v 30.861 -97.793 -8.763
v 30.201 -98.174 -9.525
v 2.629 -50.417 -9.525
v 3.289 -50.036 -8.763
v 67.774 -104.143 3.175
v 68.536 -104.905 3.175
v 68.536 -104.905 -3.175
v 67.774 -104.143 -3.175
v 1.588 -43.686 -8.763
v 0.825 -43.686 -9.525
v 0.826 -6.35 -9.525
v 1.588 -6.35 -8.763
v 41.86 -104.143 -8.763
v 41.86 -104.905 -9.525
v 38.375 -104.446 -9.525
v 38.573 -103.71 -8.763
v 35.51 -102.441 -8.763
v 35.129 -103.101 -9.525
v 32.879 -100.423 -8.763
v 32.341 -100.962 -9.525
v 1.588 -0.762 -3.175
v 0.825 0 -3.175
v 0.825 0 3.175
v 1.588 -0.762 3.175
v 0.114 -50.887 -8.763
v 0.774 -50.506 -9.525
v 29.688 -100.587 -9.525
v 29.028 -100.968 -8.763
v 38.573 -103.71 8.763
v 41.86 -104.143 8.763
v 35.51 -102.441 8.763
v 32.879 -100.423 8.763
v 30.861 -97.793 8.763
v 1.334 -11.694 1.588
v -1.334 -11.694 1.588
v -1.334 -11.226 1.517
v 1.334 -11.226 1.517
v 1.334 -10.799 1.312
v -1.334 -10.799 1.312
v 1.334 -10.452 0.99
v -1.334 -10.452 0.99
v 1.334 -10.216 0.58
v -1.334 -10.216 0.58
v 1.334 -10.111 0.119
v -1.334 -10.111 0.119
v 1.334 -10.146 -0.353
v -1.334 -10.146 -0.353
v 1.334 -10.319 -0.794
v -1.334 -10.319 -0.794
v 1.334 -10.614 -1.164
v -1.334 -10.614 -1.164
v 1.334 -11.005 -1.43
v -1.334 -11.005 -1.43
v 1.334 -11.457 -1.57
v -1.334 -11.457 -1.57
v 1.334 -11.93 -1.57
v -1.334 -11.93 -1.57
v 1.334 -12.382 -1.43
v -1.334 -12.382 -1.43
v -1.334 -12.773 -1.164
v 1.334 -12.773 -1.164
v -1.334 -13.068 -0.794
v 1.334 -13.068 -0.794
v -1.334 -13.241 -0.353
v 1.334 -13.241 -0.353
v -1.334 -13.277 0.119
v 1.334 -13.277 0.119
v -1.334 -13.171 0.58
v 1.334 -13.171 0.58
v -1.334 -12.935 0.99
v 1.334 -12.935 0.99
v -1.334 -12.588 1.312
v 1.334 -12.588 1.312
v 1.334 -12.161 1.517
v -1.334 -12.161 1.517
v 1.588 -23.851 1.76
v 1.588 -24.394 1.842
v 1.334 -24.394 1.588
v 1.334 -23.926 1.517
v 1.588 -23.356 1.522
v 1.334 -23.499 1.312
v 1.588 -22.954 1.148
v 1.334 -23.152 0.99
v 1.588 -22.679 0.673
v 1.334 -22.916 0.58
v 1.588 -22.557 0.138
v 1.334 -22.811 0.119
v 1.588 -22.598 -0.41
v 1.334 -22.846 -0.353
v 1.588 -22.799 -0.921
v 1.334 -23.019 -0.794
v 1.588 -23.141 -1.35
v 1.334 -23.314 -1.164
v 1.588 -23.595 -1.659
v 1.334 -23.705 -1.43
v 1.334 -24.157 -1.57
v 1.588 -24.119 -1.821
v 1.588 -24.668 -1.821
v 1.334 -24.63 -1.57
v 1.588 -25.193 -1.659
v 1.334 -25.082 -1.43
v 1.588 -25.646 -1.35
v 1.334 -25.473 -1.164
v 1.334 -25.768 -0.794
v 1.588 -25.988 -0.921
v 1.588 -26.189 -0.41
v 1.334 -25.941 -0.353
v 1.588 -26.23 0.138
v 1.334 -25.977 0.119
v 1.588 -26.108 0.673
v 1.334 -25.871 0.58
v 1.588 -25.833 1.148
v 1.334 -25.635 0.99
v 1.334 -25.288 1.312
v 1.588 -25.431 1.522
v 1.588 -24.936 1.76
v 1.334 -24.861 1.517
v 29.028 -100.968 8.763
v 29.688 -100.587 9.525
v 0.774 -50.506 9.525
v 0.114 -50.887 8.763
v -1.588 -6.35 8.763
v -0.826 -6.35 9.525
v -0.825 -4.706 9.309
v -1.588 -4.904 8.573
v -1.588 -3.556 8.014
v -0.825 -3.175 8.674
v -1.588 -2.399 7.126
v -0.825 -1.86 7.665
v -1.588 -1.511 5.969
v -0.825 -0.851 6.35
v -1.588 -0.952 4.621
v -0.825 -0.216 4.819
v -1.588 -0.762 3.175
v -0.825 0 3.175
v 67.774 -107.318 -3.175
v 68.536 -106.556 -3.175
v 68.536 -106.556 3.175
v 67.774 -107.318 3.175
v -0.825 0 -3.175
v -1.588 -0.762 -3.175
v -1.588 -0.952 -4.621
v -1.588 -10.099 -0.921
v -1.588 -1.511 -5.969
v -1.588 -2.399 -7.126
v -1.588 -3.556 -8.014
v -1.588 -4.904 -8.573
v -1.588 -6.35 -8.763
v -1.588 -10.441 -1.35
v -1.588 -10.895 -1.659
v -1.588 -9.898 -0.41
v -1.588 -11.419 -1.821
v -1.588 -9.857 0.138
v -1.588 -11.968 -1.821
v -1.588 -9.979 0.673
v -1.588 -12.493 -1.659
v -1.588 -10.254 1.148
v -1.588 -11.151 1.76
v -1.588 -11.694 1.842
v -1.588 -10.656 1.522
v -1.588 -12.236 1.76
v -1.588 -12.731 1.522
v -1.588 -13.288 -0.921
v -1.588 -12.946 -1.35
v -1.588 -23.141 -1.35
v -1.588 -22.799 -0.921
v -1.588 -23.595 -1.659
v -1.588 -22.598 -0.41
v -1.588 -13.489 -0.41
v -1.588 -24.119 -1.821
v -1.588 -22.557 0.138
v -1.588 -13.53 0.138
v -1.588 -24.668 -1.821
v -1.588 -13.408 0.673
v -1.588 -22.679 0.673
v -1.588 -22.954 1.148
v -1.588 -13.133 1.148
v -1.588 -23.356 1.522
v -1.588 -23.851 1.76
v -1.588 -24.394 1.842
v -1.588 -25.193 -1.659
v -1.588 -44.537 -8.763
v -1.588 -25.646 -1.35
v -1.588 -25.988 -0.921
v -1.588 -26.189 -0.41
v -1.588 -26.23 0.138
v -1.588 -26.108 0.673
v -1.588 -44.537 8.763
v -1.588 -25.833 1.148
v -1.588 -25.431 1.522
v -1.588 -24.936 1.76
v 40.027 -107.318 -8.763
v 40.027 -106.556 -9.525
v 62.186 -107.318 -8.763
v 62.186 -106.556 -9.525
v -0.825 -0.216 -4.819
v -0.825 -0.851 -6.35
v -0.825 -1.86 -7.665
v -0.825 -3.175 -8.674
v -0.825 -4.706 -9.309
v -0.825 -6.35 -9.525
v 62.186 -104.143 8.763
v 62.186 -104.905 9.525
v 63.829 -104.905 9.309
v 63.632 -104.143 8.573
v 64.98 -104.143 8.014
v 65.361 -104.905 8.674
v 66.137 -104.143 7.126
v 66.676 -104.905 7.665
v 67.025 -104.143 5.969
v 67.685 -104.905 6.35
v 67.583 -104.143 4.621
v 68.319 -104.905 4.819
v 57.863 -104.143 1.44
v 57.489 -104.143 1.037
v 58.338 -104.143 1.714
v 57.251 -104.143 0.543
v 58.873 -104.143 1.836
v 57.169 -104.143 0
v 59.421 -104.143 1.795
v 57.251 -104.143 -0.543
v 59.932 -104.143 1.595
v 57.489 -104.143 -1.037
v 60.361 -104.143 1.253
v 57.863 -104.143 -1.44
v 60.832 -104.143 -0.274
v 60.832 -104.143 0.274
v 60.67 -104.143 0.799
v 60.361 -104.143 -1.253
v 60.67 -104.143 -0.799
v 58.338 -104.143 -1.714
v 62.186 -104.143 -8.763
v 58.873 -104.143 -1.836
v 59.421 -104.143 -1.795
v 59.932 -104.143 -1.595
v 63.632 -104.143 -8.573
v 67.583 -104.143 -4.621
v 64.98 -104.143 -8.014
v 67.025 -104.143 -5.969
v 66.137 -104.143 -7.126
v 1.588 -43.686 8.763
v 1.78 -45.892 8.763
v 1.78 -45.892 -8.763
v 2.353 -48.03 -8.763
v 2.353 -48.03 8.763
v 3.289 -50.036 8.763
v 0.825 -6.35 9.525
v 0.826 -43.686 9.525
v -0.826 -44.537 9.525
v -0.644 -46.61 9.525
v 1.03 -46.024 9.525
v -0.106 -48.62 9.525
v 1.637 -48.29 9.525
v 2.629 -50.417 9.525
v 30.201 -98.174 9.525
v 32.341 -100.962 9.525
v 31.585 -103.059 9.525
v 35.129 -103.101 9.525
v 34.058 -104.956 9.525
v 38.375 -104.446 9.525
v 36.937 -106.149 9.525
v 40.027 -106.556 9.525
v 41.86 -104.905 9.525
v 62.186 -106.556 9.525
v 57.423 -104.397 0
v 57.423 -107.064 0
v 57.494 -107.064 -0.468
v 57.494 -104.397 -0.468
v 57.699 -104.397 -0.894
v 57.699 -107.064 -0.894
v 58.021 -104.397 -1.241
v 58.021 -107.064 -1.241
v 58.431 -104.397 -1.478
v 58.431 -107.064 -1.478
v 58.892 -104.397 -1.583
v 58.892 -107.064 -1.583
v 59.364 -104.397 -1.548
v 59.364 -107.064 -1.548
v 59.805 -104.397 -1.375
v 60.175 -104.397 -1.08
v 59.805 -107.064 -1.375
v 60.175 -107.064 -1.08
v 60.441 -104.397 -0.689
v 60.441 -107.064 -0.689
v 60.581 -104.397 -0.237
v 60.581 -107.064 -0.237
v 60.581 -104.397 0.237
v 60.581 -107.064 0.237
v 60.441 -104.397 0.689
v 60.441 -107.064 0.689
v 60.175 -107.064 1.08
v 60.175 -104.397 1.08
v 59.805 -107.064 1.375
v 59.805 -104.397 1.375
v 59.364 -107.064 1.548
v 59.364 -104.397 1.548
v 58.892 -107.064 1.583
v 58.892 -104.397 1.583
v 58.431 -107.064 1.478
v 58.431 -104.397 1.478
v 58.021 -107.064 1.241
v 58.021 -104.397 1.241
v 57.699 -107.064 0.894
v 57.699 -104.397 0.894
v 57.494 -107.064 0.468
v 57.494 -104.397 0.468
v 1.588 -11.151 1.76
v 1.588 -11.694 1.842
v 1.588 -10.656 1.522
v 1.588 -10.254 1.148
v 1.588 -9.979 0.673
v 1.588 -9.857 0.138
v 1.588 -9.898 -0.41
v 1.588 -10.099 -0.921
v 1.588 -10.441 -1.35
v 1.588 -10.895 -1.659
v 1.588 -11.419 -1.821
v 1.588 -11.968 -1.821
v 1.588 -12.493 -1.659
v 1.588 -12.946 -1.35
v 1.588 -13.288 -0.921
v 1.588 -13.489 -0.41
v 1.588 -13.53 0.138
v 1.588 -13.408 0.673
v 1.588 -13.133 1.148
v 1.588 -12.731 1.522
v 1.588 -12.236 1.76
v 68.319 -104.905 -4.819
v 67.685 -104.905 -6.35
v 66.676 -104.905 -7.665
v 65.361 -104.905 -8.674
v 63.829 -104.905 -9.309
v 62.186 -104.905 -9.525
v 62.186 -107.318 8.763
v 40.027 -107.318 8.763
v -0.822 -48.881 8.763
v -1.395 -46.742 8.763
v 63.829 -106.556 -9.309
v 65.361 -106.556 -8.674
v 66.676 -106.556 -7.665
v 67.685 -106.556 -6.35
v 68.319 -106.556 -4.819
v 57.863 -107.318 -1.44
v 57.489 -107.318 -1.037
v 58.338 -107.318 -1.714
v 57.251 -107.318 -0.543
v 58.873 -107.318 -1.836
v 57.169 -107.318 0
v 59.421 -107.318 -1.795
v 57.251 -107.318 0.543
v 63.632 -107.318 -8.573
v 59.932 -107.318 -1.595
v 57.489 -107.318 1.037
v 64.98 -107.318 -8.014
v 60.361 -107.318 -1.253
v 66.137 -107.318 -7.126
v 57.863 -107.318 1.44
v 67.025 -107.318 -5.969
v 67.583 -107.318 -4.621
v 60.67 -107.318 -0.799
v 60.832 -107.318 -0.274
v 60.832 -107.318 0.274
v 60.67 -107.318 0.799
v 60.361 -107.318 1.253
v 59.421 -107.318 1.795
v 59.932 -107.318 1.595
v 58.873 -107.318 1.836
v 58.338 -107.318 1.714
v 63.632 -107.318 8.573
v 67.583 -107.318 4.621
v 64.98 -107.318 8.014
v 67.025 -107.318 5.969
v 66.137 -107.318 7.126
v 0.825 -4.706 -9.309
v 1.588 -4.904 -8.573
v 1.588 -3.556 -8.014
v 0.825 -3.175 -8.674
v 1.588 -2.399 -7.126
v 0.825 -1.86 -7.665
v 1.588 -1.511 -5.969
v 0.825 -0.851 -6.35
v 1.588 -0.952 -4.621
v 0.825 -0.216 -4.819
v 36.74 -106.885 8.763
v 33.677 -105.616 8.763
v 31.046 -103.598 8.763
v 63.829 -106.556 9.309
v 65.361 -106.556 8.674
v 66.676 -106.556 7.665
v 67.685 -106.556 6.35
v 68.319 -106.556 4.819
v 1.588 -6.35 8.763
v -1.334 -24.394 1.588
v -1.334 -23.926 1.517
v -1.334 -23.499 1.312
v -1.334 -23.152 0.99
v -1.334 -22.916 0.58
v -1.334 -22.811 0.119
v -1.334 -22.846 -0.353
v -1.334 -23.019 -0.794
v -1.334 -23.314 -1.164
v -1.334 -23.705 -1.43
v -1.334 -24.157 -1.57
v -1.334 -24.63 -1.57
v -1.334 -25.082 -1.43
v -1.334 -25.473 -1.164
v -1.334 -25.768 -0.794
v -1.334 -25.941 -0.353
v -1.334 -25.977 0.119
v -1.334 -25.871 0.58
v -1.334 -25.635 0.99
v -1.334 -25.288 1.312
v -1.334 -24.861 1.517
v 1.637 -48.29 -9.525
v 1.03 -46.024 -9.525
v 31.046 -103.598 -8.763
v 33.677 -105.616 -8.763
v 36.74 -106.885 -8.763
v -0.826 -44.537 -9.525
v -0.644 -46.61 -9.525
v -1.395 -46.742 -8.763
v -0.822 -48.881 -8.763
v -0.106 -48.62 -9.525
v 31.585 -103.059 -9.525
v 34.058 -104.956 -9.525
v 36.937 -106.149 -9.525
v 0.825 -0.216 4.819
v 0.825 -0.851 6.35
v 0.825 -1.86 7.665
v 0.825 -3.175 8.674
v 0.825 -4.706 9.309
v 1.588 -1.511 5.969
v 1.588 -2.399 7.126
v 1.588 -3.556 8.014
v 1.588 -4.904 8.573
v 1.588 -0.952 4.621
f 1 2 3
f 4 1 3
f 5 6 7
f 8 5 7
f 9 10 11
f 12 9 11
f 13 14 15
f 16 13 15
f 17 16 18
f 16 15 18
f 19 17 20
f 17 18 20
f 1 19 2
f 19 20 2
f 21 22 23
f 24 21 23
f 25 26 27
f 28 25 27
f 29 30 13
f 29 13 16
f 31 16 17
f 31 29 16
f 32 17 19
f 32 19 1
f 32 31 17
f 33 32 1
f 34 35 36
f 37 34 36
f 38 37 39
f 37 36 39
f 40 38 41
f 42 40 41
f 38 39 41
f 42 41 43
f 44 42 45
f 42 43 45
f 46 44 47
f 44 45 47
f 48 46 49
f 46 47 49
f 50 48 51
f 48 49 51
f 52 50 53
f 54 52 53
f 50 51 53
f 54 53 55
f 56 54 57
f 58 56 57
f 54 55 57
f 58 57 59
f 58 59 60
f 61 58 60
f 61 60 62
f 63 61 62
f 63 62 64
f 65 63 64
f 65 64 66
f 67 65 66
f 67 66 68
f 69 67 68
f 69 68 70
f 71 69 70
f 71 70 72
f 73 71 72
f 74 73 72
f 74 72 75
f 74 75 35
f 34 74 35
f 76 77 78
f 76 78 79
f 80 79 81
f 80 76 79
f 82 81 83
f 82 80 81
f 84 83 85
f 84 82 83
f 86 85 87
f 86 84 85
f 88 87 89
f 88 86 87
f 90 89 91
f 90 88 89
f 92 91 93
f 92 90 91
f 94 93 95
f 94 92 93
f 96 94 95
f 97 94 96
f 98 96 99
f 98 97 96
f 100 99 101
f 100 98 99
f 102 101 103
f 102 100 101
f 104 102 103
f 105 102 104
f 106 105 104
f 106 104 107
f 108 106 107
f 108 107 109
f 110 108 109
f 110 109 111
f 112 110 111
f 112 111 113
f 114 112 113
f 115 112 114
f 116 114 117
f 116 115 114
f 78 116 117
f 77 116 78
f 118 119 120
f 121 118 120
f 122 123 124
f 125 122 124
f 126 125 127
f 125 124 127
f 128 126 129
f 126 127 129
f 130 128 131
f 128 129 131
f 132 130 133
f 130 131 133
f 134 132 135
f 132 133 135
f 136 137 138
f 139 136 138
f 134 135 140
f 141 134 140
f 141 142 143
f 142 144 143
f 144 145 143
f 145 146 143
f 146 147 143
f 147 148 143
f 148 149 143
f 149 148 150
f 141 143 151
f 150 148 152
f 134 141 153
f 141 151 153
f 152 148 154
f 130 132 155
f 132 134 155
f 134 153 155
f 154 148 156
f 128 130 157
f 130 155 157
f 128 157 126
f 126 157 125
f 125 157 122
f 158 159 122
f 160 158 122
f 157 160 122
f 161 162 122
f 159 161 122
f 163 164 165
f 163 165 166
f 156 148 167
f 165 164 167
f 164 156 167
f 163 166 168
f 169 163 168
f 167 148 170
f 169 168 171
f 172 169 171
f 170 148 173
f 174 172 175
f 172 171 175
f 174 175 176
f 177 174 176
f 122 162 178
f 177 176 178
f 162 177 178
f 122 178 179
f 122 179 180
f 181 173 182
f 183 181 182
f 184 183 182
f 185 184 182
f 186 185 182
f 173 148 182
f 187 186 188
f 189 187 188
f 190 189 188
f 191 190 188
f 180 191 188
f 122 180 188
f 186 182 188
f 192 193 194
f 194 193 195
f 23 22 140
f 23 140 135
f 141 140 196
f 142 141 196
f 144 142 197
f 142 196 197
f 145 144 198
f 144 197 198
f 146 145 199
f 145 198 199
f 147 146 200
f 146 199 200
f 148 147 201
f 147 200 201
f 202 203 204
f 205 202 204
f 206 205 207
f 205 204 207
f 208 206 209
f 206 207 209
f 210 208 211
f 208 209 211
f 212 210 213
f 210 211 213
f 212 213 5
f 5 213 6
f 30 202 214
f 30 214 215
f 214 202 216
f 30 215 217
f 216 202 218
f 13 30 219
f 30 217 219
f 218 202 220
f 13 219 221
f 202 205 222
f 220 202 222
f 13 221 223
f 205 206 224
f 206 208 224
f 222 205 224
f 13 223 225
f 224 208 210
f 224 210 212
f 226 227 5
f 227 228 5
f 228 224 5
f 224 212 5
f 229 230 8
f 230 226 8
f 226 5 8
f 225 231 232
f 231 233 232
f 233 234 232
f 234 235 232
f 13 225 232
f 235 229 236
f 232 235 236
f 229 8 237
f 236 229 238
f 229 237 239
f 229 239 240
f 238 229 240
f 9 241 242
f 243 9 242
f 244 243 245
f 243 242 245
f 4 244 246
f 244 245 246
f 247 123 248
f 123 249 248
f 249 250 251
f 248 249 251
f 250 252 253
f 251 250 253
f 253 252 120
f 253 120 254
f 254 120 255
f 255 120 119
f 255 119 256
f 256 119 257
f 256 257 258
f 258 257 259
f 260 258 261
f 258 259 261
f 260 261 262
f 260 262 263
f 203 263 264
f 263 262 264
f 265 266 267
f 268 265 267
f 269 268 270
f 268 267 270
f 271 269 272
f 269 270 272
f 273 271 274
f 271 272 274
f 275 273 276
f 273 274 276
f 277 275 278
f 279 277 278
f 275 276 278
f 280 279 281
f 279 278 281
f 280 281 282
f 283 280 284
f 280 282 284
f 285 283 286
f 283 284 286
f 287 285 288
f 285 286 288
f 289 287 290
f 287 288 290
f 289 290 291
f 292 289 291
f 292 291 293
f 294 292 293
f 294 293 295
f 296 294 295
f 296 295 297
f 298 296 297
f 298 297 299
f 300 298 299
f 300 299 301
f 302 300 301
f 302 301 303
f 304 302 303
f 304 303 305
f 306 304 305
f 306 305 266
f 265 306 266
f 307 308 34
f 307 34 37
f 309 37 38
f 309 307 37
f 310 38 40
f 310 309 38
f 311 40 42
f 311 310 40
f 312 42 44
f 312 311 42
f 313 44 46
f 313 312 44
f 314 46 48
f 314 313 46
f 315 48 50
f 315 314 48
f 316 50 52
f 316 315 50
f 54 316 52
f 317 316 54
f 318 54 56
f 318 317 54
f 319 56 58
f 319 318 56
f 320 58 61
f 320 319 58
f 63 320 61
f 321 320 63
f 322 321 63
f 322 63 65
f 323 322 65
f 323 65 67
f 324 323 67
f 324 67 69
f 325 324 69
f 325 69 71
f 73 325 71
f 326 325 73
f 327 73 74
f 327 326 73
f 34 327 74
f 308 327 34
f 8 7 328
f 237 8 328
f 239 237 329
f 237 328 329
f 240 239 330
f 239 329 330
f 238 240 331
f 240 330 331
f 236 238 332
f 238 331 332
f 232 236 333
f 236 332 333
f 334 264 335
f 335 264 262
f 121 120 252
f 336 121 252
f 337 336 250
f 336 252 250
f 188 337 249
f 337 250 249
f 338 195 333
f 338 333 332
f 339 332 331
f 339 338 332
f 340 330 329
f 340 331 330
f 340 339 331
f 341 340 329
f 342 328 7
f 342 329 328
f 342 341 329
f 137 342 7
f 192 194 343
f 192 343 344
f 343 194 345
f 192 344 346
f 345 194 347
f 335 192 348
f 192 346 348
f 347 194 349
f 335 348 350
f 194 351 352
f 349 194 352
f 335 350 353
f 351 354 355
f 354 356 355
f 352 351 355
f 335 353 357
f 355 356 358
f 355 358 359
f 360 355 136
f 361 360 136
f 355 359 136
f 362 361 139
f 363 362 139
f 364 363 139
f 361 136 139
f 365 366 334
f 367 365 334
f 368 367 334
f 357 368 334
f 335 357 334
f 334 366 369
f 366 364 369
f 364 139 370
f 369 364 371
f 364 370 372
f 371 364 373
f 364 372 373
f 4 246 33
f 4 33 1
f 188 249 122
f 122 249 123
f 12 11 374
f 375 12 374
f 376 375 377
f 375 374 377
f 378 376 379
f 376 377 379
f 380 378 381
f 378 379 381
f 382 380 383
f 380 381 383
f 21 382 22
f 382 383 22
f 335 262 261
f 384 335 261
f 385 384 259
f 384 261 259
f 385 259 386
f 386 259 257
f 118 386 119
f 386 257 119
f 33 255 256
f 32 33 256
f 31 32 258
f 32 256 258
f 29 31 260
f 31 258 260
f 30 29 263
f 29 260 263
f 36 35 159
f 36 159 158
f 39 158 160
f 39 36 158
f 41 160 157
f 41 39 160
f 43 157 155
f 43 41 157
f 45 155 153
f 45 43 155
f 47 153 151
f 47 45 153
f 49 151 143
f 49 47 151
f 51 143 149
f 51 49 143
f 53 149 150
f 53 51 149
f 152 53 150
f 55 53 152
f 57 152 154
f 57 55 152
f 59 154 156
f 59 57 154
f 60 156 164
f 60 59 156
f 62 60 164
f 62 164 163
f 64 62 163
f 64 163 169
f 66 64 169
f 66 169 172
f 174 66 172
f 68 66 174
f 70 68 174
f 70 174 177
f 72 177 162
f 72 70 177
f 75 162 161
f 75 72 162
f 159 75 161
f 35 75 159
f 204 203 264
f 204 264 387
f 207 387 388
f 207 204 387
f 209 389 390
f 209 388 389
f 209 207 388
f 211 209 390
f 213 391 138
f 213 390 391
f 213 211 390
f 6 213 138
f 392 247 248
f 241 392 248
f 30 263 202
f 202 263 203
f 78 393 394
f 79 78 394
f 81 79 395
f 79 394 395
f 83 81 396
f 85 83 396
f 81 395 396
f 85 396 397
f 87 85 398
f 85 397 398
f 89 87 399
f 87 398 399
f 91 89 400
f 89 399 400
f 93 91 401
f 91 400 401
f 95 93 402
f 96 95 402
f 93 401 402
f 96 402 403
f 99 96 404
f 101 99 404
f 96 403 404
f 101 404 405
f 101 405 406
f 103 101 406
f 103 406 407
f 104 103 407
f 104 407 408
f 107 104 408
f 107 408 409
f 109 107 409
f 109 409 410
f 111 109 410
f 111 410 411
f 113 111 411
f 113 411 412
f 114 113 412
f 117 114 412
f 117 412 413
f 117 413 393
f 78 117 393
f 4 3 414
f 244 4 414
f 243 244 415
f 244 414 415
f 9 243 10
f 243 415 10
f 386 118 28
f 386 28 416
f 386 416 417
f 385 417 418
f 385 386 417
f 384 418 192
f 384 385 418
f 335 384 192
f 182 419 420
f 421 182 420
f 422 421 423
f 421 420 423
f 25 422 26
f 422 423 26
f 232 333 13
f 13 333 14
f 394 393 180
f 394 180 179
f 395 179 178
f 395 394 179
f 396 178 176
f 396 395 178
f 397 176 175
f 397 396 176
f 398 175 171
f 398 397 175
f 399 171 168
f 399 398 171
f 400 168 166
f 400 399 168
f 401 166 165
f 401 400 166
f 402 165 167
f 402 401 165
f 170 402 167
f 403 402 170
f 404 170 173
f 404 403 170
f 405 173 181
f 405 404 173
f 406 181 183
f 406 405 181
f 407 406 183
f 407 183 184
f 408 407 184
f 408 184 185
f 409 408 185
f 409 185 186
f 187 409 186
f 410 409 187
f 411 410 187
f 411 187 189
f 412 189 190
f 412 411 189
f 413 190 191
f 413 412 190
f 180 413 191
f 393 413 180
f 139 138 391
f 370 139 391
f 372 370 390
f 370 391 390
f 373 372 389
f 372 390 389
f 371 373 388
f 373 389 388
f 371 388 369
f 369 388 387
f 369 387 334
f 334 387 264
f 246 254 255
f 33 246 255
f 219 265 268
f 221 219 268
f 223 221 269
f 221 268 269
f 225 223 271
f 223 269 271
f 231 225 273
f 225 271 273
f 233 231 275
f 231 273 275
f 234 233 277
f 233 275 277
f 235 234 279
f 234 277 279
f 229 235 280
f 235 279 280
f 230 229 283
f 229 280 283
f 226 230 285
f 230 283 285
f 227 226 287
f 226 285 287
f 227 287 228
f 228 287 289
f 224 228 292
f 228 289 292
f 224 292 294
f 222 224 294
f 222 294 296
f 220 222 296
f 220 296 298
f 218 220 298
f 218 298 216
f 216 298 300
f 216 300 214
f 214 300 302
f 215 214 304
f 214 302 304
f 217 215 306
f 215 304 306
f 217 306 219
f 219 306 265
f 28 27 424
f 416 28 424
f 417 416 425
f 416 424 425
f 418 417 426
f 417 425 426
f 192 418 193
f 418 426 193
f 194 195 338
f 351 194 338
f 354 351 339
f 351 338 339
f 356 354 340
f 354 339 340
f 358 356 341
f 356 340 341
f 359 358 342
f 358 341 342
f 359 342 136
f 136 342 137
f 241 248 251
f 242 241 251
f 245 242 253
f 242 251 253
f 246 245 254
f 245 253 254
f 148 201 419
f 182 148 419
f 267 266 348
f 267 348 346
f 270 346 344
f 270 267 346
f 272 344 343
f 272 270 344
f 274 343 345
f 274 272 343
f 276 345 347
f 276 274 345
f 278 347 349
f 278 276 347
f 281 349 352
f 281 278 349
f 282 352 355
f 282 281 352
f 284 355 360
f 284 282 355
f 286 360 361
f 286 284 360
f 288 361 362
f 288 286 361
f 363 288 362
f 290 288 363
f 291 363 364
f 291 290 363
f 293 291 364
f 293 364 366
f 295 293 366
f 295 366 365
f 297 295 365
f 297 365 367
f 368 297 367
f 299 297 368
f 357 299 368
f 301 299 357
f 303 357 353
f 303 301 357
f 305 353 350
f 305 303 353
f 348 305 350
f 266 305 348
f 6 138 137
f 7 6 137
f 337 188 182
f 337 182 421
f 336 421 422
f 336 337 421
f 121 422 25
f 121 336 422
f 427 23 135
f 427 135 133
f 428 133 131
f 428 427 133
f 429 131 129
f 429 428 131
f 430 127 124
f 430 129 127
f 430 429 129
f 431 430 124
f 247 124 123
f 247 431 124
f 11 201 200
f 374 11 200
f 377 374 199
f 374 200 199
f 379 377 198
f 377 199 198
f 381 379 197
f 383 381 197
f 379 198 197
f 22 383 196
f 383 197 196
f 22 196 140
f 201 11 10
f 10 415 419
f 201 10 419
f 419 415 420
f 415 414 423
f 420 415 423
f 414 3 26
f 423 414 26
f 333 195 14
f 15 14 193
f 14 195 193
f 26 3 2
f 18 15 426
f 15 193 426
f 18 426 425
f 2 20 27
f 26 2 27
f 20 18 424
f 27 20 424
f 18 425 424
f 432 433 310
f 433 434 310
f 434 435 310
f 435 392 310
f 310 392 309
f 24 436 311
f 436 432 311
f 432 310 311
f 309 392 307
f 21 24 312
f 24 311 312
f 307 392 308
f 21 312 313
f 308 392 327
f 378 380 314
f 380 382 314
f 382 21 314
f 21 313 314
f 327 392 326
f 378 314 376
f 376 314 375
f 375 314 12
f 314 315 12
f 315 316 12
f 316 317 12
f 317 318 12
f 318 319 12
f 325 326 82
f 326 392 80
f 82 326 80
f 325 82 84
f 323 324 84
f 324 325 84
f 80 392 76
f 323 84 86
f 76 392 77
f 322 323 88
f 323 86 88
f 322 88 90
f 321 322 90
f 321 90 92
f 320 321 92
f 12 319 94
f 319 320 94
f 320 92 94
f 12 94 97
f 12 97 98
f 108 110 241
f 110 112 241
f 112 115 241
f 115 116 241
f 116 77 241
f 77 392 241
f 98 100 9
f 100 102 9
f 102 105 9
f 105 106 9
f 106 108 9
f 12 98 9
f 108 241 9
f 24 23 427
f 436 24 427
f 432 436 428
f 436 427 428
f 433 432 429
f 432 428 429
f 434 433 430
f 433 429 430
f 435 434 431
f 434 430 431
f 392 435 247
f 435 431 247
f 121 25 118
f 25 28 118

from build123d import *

# Parameters (mm, degrees)
SKETCH2_W                    = 3.175
SKETCH2_H                    = 19.05
F_1_8_0_125_DIAMETER_HOLE1_D = 3.175
F_1_8_0_125_DIAMETER_HOLE2_D = 3.175
FILLET1_R                    = 12.7
FILLET2_R                    = 6.35
CHAMFER3_SIZE                = 0.762
CHAMFER2_SIZE                = 0.254


with BuildPart() as part:
    # Sweep1: sweep along a path in Sketch1
    with BuildLine(Plane.XY) as sweep1_path:
        Line((0, 0), (0, -47.5145354))
        Line((0, -47.5145354), (33.61082832, -105.730197734))
        Line((33.61082832, -105.730197734), (68.53582832, -105.730197734))
    # Sketch2 → Sweep1 (sweep)
    with BuildSketch(Plane(origin=(0, 0, 0), x_dir=(1, 0, 0), z_dir=(0, 1, 0))):
        Rectangle(SKETCH2_W, SKETCH2_H)
    sweep(path=sweep1_path.line, transition=Transition.RIGHT)

    # 1/8 (0.125) Diameter Hole1 (through all)
    with Locations(Plane(origin=(1.5875, 0, 0), x_dir=(0, 0, -1), z_dir=(1, 0, 0))):
        with Locations((0, -11.693565329), (0, -24.393565329)):
            Hole(F_1_8_0_125_DIAMETER_HOLE1_D / 2)

    # 1/8 (0.125) Diameter Hole2 (through all)
    with Locations(Plane(origin=(0, -104.142697734, 0), x_dir=(1, 0, 0), z_dir=(0, 1, 0))):
        with Locations((59.01082832, 0)):
            Hole(F_1_8_0_125_DIAMETER_HOLE2_D / 2)

    # Fillet1
    fillet1_edges = [part.edges().sort_by_distance(p)[0] for p in [
        (1.5875, -47.089166057, 0),
        (-1.5875, -47.939904743, 0),
        (32.694284767, -107.317697734, 0),
        (34.527371872, -104.142697734, 0),
    ]]
    fillet(fillet1_edges, radius=FILLET1_R)

    # Fillet2
    fillet2_edges = [part.edges().sort_by_distance(p)[0] for p in [
        (0, 0, -9.525),
        (0, 0, 9.525),
        (68.53582832, -105.730197734, -9.525),
        (68.53582832, -105.730197734, 9.525),
    ]]
    fillet(fillet2_edges, radius=FILLET2_R)

    # Chamfer3
    chamfer3_edges = [part.edges().sort_by_distance(p)[0] for p in [
        (68.53582832, -107.317697734, 0),
        (66.67595638, -107.317697734, 7.665128061),
        (66.67595638, -107.317697734, -7.665128061),
        (68.53582832, -104.142697734, 0),
        (66.67595638, -104.142697734, 7.665128061),
        (66.67595638, -104.142697734, -7.665128061),
        (1.5875, 0, 0),
        (-1.5875, 0, 0),
        (-1.5875, -25.443475, -9.525),
        (-1.5875, -25.443475, 9.525),
        (-1.5875, -1.859871939, 7.665128061),
        (-1.5875, -1.859871939, -7.665128061),
        (1.5875, -25.018105657, -9.525),
        (1.5875, -25.018105657, 9.525),
        (1.5875, -1.859871939, 7.665128061),
        (1.5875, -1.859871939, -7.665128061),
        (51.106230753, -107.317697734, -9.525),
        (51.106230753, -107.317697734, 9.525),
        (52.022774305, -104.142697734, -9.525),
        (33.676633186, -105.616220362, -9.525),
        (14.571043965, -75.927323867, -9.525),
        (17.075087517, -73.914454524, -9.525),
        (-1.154757994, -47.823951872, -9.525),
        (33.676633186, -105.616220362, -9.525),
        (14.571043965, -75.927323867, 9.525),
        (17.075087517, -73.914454524, 9.525),
        (-1.154757994, -47.823951872, 9.525),
        (33.676633186, -105.616220362, 9.525),
        (52.022774305, -104.142697734, 9.525),
        (33.676633186, -105.616220362, 9.525),
        (-1.154757994, -47.823951872, -9.525),
        (-1.154757994, -47.823951872, 9.525),
        (35.509720291, -102.441220362, 9.525),
        (35.509720291, -102.441220362, 9.525),
        (35.509720291, -102.441220362, -9.525),
        (35.509720291, -102.441220362, -9.525),
        (2.020242006, -46.973213186, 9.525),
        (2.020242006, -46.973213186, 9.525),
        (2.020242006, -46.973213186, -9.525),
        (2.020242006, -46.973213186, -9.525),
    ]]
    chamfer(chamfer3_edges, length=CHAMFER3_SIZE)

    # Chamfer2
    chamfer2_edges = [part.edges().sort_by_distance(p)[0] for p in [
        (1.5875, -24.393565329, -1.5875),
        (-1.5875, -24.393565329, -1.5875),
        (1.5875, -11.693565329, -1.5875),
        (-1.5875, -11.693565329, -1.5875),
        (60.59832832, -104.142697734, 0),
        (60.59832832, -107.317697734, 0),
    ]]
    chamfer(chamfer2_edges, length=CHAMFER2_SIZE)


solid = part.part
